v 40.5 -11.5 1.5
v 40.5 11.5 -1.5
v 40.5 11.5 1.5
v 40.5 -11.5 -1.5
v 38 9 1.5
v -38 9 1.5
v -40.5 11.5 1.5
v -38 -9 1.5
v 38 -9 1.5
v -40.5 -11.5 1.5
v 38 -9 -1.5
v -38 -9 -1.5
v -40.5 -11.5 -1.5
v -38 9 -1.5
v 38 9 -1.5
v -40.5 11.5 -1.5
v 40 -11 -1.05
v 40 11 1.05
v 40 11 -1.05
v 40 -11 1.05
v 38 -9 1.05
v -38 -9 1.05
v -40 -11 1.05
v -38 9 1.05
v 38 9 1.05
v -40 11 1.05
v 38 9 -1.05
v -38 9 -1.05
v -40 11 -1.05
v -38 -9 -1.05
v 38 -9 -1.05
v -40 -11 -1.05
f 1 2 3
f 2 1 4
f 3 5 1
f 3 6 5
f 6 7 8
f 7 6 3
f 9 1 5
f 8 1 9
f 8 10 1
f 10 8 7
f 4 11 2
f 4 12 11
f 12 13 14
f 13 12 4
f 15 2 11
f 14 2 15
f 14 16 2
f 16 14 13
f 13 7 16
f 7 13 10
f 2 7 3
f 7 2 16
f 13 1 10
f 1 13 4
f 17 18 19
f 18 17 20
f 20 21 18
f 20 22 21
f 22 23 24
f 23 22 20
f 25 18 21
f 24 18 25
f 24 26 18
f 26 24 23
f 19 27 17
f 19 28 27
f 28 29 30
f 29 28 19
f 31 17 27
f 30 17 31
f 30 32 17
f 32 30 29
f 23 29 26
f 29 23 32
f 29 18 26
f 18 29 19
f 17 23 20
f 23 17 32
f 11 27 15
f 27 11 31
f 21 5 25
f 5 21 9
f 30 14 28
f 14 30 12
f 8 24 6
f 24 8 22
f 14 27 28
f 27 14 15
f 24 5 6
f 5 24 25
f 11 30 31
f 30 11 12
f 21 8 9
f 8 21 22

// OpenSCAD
// =================================================================
// REVOLUTIONARY TECHNOLOGY: 3D EDGE-WRAPPED GUARD RING
// Completely wraps the grounded copper over the physical edge of the PCB 
// to create an absolute Faraday barrier against crosstalk.
// =================================================================

$fn = 50;

module edge_wrapped_shield(pcb_length, pcb_width, pcb_thickness, plating_thickness=0.5, wrap_depth=2.0) {
    // Calculates the continuous copper band that shields the top, side, and bottom.
    color("Copper")
    difference() {
        // 1. The outer dimensions of the copper plating
        cube([pcb_length + (plating_thickness * 2), 
              pcb_width + (plating_thickness * 2), 
              pcb_thickness + (plating_thickness * 2)], center=true);

        // 2. Core cutout where the FR4 silicon substrate resides
        cube([pcb_length, pcb_width, pcb_thickness + 0.1], center=true);

        // 3. Cut out the large top and bottom center sections.
        // This leaves only the 'wrap_depth' lip extending onto the top and bottom faces.
        cube([pcb_length - (wrap_depth * 2), 
              pcb_width - (wrap_depth * 2), 
              pcb_thickness + (plating_thickness * 4)], center=true);
    }
}

// Render example for a standard M.2 sized segment of the Snap Circuit
edge_wrapped_shield(pcb_length=80, pcb_width=22, pcb_thickness=2);
